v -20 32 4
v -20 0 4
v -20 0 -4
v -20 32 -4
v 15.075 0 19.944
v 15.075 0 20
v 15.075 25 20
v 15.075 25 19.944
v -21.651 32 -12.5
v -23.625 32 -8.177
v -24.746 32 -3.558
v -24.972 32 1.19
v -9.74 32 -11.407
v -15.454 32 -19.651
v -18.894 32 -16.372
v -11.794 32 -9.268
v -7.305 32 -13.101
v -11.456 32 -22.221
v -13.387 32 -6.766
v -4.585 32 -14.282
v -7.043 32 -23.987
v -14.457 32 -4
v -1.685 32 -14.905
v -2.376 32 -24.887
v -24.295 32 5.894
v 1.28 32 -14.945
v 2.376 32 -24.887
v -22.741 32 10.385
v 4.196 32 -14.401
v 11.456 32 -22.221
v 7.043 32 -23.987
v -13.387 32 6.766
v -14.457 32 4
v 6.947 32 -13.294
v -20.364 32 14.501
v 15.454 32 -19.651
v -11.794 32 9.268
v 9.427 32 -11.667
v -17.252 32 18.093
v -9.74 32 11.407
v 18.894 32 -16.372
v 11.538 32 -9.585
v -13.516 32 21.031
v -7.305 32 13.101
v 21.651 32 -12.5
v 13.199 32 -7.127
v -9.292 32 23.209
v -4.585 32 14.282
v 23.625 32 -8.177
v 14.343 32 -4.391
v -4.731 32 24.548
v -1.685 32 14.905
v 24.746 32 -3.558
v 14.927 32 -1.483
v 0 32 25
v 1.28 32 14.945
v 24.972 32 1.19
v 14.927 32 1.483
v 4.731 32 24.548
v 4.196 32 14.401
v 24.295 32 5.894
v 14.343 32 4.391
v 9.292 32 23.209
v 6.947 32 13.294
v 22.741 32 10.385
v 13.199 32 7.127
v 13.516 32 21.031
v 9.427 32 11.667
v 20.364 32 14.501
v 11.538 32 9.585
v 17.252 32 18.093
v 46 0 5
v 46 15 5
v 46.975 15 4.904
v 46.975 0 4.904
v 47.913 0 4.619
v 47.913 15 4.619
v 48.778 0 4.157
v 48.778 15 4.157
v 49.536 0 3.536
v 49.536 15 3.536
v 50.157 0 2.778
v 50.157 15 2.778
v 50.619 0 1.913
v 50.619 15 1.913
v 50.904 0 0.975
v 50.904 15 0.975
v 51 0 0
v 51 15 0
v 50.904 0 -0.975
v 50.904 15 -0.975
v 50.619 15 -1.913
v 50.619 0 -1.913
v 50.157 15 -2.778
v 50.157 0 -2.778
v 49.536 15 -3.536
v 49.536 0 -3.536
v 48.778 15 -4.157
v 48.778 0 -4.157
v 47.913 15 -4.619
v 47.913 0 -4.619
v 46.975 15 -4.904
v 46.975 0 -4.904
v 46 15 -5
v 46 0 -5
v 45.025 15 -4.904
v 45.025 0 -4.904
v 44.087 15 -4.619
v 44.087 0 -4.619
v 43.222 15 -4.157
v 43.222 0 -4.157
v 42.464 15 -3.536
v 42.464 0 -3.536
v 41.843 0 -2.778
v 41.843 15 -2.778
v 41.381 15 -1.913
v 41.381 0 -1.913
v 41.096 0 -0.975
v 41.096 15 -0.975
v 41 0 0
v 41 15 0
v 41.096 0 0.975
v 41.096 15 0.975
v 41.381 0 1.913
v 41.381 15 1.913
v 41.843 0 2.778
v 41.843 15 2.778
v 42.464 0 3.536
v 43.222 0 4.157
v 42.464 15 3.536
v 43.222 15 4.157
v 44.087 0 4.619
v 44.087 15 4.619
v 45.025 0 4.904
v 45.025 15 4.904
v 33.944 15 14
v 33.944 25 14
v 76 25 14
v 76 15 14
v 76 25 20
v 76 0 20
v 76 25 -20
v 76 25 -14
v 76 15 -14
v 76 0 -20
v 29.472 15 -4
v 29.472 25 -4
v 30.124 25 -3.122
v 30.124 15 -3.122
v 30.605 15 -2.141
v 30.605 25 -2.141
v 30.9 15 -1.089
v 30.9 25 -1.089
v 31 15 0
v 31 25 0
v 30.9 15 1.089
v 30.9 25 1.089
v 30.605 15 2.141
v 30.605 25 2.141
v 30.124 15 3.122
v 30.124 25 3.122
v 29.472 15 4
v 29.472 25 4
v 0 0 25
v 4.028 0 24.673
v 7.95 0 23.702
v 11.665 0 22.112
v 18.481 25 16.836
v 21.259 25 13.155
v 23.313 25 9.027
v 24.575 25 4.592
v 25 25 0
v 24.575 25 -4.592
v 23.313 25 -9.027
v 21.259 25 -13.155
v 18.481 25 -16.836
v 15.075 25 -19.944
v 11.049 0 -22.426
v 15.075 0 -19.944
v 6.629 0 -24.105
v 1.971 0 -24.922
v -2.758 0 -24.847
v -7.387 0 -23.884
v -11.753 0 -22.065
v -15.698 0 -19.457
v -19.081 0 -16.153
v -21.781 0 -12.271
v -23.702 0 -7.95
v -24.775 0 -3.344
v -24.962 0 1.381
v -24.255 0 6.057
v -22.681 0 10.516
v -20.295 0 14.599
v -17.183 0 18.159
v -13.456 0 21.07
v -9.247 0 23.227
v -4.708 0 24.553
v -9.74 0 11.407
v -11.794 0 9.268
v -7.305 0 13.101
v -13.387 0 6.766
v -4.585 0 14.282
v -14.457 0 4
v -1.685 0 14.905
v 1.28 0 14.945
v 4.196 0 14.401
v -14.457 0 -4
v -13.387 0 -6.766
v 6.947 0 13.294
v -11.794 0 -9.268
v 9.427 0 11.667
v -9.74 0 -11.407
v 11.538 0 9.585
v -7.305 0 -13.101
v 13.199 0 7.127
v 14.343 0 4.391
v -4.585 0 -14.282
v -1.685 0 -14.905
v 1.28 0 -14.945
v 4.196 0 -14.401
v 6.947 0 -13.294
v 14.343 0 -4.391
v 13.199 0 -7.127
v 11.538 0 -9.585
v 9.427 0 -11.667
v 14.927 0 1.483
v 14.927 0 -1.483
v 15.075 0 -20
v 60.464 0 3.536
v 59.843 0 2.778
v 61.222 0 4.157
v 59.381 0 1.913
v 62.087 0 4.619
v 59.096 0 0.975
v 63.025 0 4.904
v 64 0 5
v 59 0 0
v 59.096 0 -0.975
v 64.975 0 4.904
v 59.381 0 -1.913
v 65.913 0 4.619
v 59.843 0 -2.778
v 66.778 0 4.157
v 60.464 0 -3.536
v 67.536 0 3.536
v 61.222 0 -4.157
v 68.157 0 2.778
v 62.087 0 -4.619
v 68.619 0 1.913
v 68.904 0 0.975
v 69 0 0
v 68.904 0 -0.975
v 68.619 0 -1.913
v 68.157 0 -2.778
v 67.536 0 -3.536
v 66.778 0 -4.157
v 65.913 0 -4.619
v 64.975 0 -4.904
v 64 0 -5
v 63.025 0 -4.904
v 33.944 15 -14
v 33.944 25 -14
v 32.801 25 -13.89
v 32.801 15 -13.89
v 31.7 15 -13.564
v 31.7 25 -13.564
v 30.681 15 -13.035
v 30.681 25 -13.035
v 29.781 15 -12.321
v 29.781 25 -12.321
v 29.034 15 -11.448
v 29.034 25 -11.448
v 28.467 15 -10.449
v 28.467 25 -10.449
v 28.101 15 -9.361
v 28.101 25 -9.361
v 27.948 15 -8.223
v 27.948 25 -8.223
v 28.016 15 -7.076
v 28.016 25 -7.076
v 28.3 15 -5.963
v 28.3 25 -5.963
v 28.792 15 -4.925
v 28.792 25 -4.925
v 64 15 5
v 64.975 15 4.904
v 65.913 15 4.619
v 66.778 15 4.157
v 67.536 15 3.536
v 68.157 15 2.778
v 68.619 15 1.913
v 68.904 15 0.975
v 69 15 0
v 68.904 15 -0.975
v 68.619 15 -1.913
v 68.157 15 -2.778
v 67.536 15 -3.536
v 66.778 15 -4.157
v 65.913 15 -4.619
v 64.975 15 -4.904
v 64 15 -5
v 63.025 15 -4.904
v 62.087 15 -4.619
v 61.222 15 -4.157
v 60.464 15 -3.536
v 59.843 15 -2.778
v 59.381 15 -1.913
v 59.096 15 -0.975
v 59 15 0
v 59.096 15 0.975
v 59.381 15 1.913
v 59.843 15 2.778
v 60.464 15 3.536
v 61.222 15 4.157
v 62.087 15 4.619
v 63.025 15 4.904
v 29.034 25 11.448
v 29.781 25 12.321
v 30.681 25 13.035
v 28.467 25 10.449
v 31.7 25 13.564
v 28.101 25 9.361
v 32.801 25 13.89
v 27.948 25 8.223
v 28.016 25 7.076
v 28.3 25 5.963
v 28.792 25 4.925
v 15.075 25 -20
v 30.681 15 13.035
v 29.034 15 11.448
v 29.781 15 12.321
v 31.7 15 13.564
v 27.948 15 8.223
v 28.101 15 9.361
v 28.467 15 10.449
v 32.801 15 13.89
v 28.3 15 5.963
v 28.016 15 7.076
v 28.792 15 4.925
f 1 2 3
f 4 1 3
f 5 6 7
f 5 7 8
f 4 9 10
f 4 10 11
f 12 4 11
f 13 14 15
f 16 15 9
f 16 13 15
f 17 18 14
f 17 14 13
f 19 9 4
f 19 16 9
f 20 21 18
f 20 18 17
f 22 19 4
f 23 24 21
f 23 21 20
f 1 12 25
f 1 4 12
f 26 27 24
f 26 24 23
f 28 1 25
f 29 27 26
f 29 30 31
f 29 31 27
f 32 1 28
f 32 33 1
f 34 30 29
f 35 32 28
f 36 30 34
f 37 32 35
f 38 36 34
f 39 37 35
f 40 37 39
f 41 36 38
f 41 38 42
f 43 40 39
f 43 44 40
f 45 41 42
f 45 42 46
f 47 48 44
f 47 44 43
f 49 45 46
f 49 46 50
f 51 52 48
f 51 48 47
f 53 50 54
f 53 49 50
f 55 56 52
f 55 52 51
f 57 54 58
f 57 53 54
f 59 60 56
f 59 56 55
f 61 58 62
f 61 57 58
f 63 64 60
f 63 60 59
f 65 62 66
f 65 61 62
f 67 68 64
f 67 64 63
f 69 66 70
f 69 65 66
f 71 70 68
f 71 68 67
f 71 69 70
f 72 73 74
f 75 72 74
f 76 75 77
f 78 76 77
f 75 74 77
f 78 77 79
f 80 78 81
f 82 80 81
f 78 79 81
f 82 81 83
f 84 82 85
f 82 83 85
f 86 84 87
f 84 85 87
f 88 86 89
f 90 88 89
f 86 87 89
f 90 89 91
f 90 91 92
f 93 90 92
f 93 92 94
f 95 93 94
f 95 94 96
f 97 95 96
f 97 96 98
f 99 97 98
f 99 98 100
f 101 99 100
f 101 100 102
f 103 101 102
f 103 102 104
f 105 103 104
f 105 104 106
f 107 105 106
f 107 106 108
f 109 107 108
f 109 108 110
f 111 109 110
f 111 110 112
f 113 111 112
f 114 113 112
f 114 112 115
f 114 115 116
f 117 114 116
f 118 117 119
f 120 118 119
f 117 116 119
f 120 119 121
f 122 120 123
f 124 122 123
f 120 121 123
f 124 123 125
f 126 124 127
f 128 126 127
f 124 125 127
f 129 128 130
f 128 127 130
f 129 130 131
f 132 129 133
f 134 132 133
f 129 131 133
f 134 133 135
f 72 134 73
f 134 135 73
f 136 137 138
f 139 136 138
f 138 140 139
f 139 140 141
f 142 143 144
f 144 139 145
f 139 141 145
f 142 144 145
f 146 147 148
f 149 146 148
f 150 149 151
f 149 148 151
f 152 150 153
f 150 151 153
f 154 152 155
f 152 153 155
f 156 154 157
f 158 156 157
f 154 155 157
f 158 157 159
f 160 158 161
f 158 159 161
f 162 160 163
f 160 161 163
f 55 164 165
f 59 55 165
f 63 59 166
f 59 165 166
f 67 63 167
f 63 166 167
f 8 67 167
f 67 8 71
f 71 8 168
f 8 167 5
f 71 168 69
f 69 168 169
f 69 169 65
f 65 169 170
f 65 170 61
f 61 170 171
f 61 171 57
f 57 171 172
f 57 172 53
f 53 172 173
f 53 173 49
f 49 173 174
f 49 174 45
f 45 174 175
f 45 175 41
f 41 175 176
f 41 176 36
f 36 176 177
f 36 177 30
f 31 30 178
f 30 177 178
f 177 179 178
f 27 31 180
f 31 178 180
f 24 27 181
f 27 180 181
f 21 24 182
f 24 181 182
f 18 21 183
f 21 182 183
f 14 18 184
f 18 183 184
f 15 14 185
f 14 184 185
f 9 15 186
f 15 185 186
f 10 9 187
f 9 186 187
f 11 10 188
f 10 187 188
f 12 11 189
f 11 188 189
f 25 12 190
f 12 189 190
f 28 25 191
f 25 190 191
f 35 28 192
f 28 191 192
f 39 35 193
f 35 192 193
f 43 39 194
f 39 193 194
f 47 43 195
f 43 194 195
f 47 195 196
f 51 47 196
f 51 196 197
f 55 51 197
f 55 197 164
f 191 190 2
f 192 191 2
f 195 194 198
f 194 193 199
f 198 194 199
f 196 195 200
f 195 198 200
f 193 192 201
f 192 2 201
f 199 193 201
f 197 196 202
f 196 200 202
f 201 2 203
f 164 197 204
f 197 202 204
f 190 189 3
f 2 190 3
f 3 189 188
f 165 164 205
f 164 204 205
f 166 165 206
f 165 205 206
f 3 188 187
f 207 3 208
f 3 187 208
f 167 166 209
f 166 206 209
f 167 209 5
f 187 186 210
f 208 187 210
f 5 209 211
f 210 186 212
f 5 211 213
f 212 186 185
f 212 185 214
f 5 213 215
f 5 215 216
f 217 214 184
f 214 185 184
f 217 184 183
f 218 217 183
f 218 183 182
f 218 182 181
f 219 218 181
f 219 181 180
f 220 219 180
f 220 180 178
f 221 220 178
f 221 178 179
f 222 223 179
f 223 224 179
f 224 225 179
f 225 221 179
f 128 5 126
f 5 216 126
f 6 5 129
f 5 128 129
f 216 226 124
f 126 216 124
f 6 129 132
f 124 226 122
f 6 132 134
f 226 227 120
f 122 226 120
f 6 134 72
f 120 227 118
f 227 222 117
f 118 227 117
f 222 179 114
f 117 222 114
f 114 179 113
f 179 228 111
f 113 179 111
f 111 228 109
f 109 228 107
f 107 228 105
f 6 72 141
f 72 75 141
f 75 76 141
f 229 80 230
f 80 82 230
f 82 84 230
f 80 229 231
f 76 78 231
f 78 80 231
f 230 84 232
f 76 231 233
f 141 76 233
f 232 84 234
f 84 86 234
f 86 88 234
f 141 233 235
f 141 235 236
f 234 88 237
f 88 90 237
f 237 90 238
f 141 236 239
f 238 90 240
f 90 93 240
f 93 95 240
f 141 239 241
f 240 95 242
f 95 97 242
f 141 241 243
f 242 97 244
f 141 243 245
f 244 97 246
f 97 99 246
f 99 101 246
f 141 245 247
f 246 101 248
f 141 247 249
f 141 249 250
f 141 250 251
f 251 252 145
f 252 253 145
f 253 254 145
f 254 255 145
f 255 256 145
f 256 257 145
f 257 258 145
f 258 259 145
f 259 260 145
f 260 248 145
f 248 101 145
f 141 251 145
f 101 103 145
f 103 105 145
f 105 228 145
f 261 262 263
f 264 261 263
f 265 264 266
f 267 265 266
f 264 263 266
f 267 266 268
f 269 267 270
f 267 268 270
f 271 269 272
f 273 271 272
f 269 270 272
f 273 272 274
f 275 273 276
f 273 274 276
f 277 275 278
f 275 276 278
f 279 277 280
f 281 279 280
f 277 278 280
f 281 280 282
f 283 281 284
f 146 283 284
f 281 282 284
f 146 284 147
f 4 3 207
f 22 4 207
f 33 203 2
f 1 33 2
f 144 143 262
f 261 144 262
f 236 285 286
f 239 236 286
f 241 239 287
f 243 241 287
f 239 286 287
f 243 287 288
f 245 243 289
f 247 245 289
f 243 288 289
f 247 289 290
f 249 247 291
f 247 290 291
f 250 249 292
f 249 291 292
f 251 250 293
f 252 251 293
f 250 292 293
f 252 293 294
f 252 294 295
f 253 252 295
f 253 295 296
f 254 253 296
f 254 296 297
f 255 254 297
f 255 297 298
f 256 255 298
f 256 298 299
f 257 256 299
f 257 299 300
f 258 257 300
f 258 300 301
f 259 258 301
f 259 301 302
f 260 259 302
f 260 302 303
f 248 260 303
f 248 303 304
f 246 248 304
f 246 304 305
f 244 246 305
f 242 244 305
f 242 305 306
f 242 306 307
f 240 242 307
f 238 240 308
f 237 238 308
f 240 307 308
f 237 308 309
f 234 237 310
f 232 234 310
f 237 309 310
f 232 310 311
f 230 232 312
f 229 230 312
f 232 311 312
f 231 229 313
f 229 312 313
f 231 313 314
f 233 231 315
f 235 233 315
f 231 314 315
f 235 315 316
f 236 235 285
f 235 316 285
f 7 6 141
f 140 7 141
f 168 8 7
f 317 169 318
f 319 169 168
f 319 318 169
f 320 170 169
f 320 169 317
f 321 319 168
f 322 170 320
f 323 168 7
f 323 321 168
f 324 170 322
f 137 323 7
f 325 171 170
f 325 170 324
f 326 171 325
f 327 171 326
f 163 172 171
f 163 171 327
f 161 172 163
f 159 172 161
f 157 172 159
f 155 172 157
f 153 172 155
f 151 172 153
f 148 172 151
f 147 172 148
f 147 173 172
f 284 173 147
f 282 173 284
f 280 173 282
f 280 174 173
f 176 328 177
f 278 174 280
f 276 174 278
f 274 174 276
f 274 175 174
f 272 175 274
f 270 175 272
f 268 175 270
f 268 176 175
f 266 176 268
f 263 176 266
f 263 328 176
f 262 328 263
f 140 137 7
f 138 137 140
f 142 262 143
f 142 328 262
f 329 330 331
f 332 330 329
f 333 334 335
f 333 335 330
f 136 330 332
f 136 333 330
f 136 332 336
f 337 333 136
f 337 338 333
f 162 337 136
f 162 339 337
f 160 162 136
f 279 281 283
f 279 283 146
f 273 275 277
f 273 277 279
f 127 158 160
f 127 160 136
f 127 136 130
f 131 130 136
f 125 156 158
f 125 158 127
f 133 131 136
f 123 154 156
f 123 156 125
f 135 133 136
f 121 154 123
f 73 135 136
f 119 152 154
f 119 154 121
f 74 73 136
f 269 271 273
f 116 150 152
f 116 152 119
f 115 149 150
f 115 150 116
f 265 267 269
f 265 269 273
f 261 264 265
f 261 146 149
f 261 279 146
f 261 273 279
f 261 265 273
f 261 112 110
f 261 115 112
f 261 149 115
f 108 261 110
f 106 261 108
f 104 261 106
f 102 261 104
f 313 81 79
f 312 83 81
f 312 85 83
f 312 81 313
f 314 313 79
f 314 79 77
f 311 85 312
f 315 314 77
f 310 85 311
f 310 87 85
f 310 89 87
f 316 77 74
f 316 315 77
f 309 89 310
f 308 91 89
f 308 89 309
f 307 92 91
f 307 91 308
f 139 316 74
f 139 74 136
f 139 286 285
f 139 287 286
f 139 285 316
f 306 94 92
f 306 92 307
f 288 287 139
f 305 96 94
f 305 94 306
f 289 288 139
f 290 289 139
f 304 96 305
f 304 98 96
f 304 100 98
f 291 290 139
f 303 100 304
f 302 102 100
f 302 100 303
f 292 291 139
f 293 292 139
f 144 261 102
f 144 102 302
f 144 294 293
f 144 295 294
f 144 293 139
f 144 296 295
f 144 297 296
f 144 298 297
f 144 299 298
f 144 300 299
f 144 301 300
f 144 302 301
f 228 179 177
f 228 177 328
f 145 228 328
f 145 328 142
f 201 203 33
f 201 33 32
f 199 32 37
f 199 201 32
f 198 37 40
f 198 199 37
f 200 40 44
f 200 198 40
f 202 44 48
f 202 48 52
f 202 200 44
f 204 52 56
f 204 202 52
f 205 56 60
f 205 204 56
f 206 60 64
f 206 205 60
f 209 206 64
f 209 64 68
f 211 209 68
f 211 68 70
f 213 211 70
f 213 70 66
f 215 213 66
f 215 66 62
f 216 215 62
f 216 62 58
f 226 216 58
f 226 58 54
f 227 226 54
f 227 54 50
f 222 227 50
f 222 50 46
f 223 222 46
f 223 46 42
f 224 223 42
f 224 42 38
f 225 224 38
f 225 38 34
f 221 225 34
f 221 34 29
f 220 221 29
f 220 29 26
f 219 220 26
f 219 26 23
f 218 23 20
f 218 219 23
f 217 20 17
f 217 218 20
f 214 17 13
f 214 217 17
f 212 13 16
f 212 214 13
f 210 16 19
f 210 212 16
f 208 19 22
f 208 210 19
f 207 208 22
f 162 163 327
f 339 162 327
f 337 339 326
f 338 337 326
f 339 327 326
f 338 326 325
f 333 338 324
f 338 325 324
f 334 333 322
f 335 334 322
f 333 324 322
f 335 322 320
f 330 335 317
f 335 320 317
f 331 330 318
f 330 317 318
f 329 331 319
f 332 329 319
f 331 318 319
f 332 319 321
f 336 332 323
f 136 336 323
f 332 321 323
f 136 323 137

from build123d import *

# Parameters (mm, degrees)
SKETCH_1_R          = 25
SKETCH_1_R_2        = 15
EXTRUDE_1_DEPTH     = 32
EXTRUDE_START       = -32
SKETCH_2_W          = 60.925429914
SKETCH_2_H          = 40
EXTRUDE_2_DEPTH     = 25
CUT_EXTRUDE_1_DEPTH = 10
SKETCH_4_R          = 5
CUT_EXTRUDE_2_DEPTH = 48
CUT_EXTRUDE_START   = -48
CUT_EXTRUDE_3_DEPTH = 48


with BuildPart() as part:
    # 草图1 → 凸台-拉伸1 (new body)
    with BuildSketch(Plane(origin=(0, 0, 0), x_dir=(1, 0, 0), z_dir=(0, 1, 0))):
        with Locations(Location((0, 0, 0), (0, 0, 270))):
            Circle(SKETCH_1_R)
        with Locations(Location((0, 0, 0), (0, 0, 270))):
            Circle(SKETCH_1_R_2, mode=Mode.SUBTRACT)
    extrude(amount=EXTRUDE_1_DEPTH)

    # 草图2 → 凸台-拉伸2 (add)
    with BuildSketch(Plane(origin=(0, 32, 0), x_dir=(1, 0, 0), z_dir=(0, 1, 0)).offset(EXTRUDE_START)):
        with Locations((45.537285043, 0)):
            Rectangle(SKETCH_2_W, SKETCH_2_H)
    extrude(amount=EXTRUDE_2_DEPTH)

    # 草图3 → 切除-拉伸1 (cut)
    with BuildSketch(Plane(origin=(0, 25, 0), x_dir=(1, 0, 0), z_dir=(0, 1, 0))):
        with BuildLine():
            Line((76, 14), (33.94427191, 14))
            ThreePointArc((33.94427191, 14), (28.467046335, 10.449489743), (29.472135955, 4))
            ThreePointArc((29.472135955, 4), (31, 0), (29.472135955, -4))
            ThreePointArc((29.472135955, -4), (28.467046335, -10.449489743), (33.94427191, -14))
            Line((33.94427191, -14), (76, -14))
            Line((76, -14), (76, 14))
        make_face()
    extrude(amount=-CUT_EXTRUDE_1_DEPTH, mode=Mode.SUBTRACT)

    # 草图4 → 切除-拉伸2 (cut)
    with BuildSketch(Plane(origin=(0, 15, 0), x_dir=(1, 0, 0), z_dir=(0, 1, 0))):
        with Locations(Location((46, 0, 0), (0, 0, 270))):
            Circle(SKETCH_4_R)
        with Locations(Location((64, 0, 0), (0, 0, 270))):
            Circle(SKETCH_4_R)
    extrude(amount=-CUT_EXTRUDE_2_DEPTH, mode=Mode.SUBTRACT)

    # 草图5 → 切除-拉伸3 (cut)
    with BuildSketch(Plane(origin=(0, 32, 0), x_dir=(1, 0, 0), z_dir=(0, 1, 0)).offset(CUT_EXTRUDE_START)):
        with BuildLine():
            Line((-20, 4), (-14.456832295, 4))
            ThreePointArc((-14.456832295, 4), (-15, 0), (-14.456832295, -4))
            Line((-14.456832295, -4), (-20, -4))
            Line((-20, -4), (-20, 4))
        make_face()
    extrude(amount=CUT_EXTRUDE_3_DEPTH, mode=Mode.SUBTRACT)


solid = part.part
